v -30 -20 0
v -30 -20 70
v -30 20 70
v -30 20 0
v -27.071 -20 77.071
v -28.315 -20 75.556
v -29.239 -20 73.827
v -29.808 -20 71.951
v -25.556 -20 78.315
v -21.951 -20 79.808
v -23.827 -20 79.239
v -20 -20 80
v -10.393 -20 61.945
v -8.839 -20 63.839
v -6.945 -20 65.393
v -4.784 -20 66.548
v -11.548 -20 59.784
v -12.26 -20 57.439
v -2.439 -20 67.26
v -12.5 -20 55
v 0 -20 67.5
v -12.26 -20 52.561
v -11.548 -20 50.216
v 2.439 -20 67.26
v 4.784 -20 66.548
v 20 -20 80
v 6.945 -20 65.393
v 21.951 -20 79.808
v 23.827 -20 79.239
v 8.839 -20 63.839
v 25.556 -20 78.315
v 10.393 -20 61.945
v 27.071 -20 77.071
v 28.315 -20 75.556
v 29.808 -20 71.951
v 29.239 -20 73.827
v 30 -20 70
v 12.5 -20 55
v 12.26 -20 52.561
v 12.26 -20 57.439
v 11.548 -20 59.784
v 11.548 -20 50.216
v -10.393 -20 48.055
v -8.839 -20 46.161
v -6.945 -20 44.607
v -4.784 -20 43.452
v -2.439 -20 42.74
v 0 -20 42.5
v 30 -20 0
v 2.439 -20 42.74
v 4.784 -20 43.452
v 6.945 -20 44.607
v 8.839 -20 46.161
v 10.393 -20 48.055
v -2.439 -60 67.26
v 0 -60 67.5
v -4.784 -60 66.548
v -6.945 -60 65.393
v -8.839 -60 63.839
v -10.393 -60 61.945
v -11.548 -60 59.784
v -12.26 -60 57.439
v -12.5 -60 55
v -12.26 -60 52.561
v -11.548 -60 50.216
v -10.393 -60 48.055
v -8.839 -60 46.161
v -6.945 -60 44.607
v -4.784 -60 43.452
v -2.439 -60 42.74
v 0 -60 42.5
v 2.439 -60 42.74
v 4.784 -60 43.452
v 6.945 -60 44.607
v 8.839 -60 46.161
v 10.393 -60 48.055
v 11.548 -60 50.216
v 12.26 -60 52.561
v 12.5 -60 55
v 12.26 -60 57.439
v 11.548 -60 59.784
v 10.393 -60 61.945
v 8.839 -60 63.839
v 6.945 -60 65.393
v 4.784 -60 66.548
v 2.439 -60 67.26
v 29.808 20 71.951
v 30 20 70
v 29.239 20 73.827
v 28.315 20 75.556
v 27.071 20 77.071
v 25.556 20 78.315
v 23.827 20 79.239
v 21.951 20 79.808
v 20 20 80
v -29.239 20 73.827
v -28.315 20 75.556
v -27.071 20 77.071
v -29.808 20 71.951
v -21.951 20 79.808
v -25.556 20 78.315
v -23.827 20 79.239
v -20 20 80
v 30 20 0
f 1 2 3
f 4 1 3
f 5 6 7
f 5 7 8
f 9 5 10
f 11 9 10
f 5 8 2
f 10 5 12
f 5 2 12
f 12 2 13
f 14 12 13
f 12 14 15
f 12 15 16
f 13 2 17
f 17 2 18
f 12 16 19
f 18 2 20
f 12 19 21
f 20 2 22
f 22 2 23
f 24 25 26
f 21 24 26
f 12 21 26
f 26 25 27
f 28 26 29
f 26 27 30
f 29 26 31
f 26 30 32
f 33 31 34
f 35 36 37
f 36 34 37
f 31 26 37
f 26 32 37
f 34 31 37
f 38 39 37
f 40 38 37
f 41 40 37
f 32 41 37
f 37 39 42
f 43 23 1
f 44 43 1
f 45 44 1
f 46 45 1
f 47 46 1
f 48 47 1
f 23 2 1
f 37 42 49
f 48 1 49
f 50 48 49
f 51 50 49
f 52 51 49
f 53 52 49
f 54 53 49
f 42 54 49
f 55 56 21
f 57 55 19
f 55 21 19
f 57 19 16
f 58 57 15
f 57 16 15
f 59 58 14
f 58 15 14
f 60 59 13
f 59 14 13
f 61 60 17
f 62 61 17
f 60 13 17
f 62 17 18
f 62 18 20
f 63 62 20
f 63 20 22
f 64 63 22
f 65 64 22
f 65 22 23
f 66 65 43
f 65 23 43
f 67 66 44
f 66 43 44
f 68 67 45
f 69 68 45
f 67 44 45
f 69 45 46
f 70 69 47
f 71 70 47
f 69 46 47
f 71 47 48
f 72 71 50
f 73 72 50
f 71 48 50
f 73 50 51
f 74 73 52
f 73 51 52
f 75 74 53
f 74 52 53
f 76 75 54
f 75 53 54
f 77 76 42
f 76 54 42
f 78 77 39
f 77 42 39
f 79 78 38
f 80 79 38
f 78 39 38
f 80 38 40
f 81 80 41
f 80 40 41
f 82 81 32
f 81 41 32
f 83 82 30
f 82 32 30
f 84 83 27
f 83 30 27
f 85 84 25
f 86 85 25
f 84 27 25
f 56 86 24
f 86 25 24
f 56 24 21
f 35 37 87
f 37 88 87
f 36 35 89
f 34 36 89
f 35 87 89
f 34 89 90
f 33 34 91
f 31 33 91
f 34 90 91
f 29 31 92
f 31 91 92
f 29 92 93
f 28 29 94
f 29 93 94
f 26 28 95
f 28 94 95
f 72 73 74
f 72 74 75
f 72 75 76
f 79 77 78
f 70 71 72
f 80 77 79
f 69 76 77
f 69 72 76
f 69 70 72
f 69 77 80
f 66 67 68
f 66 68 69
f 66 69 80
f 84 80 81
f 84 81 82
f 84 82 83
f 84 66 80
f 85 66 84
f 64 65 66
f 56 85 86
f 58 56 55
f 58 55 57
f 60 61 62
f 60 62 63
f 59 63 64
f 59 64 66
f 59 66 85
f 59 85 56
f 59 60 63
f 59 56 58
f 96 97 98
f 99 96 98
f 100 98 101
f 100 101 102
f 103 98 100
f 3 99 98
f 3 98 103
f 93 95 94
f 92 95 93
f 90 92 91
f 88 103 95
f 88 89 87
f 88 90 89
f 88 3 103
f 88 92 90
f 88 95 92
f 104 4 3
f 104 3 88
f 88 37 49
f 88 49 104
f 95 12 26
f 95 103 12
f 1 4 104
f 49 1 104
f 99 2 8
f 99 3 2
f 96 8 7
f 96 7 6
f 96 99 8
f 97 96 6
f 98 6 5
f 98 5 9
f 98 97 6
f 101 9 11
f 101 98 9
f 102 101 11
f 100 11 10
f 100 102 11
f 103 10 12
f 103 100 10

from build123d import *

# Parameters (mm, degrees)
CROQUIS1_W              = 60
CROQUIS1_H              = 40
SALIENTE_EXTRUIR1_DEPTH = 80
REDONDEO1_R             = 10
CROQUIS2_R              = 12.5
SALIENTE_EXTRUIR2_DEPTH = 40


with BuildPart() as part:
    # Croquis1 → Saliente-Extruir1 (new body)
    with BuildSketch(Plane.XY):
        Rectangle(CROQUIS1_W, CROQUIS1_H)
    extrude(amount=SALIENTE_EXTRUIR1_DEPTH)

    # Redondeo1
    redondeo1_edges = [part.edges().sort_by_distance(p)[0] for p in [
        (-30, 0, 80),
        (30, 0, 80),
    ]]
    fillet(redondeo1_edges, radius=REDONDEO1_R)

    # Croquis2 → Saliente-Extruir2 (add)
    with BuildSketch(Plane.XZ.offset(20)):
        with Locations(Location((0, 55, 0), (0, 0, 90))):
            Circle(CROQUIS2_R)
    extrude(amount=SALIENTE_EXTRUIR2_DEPTH)


solid = part.part
